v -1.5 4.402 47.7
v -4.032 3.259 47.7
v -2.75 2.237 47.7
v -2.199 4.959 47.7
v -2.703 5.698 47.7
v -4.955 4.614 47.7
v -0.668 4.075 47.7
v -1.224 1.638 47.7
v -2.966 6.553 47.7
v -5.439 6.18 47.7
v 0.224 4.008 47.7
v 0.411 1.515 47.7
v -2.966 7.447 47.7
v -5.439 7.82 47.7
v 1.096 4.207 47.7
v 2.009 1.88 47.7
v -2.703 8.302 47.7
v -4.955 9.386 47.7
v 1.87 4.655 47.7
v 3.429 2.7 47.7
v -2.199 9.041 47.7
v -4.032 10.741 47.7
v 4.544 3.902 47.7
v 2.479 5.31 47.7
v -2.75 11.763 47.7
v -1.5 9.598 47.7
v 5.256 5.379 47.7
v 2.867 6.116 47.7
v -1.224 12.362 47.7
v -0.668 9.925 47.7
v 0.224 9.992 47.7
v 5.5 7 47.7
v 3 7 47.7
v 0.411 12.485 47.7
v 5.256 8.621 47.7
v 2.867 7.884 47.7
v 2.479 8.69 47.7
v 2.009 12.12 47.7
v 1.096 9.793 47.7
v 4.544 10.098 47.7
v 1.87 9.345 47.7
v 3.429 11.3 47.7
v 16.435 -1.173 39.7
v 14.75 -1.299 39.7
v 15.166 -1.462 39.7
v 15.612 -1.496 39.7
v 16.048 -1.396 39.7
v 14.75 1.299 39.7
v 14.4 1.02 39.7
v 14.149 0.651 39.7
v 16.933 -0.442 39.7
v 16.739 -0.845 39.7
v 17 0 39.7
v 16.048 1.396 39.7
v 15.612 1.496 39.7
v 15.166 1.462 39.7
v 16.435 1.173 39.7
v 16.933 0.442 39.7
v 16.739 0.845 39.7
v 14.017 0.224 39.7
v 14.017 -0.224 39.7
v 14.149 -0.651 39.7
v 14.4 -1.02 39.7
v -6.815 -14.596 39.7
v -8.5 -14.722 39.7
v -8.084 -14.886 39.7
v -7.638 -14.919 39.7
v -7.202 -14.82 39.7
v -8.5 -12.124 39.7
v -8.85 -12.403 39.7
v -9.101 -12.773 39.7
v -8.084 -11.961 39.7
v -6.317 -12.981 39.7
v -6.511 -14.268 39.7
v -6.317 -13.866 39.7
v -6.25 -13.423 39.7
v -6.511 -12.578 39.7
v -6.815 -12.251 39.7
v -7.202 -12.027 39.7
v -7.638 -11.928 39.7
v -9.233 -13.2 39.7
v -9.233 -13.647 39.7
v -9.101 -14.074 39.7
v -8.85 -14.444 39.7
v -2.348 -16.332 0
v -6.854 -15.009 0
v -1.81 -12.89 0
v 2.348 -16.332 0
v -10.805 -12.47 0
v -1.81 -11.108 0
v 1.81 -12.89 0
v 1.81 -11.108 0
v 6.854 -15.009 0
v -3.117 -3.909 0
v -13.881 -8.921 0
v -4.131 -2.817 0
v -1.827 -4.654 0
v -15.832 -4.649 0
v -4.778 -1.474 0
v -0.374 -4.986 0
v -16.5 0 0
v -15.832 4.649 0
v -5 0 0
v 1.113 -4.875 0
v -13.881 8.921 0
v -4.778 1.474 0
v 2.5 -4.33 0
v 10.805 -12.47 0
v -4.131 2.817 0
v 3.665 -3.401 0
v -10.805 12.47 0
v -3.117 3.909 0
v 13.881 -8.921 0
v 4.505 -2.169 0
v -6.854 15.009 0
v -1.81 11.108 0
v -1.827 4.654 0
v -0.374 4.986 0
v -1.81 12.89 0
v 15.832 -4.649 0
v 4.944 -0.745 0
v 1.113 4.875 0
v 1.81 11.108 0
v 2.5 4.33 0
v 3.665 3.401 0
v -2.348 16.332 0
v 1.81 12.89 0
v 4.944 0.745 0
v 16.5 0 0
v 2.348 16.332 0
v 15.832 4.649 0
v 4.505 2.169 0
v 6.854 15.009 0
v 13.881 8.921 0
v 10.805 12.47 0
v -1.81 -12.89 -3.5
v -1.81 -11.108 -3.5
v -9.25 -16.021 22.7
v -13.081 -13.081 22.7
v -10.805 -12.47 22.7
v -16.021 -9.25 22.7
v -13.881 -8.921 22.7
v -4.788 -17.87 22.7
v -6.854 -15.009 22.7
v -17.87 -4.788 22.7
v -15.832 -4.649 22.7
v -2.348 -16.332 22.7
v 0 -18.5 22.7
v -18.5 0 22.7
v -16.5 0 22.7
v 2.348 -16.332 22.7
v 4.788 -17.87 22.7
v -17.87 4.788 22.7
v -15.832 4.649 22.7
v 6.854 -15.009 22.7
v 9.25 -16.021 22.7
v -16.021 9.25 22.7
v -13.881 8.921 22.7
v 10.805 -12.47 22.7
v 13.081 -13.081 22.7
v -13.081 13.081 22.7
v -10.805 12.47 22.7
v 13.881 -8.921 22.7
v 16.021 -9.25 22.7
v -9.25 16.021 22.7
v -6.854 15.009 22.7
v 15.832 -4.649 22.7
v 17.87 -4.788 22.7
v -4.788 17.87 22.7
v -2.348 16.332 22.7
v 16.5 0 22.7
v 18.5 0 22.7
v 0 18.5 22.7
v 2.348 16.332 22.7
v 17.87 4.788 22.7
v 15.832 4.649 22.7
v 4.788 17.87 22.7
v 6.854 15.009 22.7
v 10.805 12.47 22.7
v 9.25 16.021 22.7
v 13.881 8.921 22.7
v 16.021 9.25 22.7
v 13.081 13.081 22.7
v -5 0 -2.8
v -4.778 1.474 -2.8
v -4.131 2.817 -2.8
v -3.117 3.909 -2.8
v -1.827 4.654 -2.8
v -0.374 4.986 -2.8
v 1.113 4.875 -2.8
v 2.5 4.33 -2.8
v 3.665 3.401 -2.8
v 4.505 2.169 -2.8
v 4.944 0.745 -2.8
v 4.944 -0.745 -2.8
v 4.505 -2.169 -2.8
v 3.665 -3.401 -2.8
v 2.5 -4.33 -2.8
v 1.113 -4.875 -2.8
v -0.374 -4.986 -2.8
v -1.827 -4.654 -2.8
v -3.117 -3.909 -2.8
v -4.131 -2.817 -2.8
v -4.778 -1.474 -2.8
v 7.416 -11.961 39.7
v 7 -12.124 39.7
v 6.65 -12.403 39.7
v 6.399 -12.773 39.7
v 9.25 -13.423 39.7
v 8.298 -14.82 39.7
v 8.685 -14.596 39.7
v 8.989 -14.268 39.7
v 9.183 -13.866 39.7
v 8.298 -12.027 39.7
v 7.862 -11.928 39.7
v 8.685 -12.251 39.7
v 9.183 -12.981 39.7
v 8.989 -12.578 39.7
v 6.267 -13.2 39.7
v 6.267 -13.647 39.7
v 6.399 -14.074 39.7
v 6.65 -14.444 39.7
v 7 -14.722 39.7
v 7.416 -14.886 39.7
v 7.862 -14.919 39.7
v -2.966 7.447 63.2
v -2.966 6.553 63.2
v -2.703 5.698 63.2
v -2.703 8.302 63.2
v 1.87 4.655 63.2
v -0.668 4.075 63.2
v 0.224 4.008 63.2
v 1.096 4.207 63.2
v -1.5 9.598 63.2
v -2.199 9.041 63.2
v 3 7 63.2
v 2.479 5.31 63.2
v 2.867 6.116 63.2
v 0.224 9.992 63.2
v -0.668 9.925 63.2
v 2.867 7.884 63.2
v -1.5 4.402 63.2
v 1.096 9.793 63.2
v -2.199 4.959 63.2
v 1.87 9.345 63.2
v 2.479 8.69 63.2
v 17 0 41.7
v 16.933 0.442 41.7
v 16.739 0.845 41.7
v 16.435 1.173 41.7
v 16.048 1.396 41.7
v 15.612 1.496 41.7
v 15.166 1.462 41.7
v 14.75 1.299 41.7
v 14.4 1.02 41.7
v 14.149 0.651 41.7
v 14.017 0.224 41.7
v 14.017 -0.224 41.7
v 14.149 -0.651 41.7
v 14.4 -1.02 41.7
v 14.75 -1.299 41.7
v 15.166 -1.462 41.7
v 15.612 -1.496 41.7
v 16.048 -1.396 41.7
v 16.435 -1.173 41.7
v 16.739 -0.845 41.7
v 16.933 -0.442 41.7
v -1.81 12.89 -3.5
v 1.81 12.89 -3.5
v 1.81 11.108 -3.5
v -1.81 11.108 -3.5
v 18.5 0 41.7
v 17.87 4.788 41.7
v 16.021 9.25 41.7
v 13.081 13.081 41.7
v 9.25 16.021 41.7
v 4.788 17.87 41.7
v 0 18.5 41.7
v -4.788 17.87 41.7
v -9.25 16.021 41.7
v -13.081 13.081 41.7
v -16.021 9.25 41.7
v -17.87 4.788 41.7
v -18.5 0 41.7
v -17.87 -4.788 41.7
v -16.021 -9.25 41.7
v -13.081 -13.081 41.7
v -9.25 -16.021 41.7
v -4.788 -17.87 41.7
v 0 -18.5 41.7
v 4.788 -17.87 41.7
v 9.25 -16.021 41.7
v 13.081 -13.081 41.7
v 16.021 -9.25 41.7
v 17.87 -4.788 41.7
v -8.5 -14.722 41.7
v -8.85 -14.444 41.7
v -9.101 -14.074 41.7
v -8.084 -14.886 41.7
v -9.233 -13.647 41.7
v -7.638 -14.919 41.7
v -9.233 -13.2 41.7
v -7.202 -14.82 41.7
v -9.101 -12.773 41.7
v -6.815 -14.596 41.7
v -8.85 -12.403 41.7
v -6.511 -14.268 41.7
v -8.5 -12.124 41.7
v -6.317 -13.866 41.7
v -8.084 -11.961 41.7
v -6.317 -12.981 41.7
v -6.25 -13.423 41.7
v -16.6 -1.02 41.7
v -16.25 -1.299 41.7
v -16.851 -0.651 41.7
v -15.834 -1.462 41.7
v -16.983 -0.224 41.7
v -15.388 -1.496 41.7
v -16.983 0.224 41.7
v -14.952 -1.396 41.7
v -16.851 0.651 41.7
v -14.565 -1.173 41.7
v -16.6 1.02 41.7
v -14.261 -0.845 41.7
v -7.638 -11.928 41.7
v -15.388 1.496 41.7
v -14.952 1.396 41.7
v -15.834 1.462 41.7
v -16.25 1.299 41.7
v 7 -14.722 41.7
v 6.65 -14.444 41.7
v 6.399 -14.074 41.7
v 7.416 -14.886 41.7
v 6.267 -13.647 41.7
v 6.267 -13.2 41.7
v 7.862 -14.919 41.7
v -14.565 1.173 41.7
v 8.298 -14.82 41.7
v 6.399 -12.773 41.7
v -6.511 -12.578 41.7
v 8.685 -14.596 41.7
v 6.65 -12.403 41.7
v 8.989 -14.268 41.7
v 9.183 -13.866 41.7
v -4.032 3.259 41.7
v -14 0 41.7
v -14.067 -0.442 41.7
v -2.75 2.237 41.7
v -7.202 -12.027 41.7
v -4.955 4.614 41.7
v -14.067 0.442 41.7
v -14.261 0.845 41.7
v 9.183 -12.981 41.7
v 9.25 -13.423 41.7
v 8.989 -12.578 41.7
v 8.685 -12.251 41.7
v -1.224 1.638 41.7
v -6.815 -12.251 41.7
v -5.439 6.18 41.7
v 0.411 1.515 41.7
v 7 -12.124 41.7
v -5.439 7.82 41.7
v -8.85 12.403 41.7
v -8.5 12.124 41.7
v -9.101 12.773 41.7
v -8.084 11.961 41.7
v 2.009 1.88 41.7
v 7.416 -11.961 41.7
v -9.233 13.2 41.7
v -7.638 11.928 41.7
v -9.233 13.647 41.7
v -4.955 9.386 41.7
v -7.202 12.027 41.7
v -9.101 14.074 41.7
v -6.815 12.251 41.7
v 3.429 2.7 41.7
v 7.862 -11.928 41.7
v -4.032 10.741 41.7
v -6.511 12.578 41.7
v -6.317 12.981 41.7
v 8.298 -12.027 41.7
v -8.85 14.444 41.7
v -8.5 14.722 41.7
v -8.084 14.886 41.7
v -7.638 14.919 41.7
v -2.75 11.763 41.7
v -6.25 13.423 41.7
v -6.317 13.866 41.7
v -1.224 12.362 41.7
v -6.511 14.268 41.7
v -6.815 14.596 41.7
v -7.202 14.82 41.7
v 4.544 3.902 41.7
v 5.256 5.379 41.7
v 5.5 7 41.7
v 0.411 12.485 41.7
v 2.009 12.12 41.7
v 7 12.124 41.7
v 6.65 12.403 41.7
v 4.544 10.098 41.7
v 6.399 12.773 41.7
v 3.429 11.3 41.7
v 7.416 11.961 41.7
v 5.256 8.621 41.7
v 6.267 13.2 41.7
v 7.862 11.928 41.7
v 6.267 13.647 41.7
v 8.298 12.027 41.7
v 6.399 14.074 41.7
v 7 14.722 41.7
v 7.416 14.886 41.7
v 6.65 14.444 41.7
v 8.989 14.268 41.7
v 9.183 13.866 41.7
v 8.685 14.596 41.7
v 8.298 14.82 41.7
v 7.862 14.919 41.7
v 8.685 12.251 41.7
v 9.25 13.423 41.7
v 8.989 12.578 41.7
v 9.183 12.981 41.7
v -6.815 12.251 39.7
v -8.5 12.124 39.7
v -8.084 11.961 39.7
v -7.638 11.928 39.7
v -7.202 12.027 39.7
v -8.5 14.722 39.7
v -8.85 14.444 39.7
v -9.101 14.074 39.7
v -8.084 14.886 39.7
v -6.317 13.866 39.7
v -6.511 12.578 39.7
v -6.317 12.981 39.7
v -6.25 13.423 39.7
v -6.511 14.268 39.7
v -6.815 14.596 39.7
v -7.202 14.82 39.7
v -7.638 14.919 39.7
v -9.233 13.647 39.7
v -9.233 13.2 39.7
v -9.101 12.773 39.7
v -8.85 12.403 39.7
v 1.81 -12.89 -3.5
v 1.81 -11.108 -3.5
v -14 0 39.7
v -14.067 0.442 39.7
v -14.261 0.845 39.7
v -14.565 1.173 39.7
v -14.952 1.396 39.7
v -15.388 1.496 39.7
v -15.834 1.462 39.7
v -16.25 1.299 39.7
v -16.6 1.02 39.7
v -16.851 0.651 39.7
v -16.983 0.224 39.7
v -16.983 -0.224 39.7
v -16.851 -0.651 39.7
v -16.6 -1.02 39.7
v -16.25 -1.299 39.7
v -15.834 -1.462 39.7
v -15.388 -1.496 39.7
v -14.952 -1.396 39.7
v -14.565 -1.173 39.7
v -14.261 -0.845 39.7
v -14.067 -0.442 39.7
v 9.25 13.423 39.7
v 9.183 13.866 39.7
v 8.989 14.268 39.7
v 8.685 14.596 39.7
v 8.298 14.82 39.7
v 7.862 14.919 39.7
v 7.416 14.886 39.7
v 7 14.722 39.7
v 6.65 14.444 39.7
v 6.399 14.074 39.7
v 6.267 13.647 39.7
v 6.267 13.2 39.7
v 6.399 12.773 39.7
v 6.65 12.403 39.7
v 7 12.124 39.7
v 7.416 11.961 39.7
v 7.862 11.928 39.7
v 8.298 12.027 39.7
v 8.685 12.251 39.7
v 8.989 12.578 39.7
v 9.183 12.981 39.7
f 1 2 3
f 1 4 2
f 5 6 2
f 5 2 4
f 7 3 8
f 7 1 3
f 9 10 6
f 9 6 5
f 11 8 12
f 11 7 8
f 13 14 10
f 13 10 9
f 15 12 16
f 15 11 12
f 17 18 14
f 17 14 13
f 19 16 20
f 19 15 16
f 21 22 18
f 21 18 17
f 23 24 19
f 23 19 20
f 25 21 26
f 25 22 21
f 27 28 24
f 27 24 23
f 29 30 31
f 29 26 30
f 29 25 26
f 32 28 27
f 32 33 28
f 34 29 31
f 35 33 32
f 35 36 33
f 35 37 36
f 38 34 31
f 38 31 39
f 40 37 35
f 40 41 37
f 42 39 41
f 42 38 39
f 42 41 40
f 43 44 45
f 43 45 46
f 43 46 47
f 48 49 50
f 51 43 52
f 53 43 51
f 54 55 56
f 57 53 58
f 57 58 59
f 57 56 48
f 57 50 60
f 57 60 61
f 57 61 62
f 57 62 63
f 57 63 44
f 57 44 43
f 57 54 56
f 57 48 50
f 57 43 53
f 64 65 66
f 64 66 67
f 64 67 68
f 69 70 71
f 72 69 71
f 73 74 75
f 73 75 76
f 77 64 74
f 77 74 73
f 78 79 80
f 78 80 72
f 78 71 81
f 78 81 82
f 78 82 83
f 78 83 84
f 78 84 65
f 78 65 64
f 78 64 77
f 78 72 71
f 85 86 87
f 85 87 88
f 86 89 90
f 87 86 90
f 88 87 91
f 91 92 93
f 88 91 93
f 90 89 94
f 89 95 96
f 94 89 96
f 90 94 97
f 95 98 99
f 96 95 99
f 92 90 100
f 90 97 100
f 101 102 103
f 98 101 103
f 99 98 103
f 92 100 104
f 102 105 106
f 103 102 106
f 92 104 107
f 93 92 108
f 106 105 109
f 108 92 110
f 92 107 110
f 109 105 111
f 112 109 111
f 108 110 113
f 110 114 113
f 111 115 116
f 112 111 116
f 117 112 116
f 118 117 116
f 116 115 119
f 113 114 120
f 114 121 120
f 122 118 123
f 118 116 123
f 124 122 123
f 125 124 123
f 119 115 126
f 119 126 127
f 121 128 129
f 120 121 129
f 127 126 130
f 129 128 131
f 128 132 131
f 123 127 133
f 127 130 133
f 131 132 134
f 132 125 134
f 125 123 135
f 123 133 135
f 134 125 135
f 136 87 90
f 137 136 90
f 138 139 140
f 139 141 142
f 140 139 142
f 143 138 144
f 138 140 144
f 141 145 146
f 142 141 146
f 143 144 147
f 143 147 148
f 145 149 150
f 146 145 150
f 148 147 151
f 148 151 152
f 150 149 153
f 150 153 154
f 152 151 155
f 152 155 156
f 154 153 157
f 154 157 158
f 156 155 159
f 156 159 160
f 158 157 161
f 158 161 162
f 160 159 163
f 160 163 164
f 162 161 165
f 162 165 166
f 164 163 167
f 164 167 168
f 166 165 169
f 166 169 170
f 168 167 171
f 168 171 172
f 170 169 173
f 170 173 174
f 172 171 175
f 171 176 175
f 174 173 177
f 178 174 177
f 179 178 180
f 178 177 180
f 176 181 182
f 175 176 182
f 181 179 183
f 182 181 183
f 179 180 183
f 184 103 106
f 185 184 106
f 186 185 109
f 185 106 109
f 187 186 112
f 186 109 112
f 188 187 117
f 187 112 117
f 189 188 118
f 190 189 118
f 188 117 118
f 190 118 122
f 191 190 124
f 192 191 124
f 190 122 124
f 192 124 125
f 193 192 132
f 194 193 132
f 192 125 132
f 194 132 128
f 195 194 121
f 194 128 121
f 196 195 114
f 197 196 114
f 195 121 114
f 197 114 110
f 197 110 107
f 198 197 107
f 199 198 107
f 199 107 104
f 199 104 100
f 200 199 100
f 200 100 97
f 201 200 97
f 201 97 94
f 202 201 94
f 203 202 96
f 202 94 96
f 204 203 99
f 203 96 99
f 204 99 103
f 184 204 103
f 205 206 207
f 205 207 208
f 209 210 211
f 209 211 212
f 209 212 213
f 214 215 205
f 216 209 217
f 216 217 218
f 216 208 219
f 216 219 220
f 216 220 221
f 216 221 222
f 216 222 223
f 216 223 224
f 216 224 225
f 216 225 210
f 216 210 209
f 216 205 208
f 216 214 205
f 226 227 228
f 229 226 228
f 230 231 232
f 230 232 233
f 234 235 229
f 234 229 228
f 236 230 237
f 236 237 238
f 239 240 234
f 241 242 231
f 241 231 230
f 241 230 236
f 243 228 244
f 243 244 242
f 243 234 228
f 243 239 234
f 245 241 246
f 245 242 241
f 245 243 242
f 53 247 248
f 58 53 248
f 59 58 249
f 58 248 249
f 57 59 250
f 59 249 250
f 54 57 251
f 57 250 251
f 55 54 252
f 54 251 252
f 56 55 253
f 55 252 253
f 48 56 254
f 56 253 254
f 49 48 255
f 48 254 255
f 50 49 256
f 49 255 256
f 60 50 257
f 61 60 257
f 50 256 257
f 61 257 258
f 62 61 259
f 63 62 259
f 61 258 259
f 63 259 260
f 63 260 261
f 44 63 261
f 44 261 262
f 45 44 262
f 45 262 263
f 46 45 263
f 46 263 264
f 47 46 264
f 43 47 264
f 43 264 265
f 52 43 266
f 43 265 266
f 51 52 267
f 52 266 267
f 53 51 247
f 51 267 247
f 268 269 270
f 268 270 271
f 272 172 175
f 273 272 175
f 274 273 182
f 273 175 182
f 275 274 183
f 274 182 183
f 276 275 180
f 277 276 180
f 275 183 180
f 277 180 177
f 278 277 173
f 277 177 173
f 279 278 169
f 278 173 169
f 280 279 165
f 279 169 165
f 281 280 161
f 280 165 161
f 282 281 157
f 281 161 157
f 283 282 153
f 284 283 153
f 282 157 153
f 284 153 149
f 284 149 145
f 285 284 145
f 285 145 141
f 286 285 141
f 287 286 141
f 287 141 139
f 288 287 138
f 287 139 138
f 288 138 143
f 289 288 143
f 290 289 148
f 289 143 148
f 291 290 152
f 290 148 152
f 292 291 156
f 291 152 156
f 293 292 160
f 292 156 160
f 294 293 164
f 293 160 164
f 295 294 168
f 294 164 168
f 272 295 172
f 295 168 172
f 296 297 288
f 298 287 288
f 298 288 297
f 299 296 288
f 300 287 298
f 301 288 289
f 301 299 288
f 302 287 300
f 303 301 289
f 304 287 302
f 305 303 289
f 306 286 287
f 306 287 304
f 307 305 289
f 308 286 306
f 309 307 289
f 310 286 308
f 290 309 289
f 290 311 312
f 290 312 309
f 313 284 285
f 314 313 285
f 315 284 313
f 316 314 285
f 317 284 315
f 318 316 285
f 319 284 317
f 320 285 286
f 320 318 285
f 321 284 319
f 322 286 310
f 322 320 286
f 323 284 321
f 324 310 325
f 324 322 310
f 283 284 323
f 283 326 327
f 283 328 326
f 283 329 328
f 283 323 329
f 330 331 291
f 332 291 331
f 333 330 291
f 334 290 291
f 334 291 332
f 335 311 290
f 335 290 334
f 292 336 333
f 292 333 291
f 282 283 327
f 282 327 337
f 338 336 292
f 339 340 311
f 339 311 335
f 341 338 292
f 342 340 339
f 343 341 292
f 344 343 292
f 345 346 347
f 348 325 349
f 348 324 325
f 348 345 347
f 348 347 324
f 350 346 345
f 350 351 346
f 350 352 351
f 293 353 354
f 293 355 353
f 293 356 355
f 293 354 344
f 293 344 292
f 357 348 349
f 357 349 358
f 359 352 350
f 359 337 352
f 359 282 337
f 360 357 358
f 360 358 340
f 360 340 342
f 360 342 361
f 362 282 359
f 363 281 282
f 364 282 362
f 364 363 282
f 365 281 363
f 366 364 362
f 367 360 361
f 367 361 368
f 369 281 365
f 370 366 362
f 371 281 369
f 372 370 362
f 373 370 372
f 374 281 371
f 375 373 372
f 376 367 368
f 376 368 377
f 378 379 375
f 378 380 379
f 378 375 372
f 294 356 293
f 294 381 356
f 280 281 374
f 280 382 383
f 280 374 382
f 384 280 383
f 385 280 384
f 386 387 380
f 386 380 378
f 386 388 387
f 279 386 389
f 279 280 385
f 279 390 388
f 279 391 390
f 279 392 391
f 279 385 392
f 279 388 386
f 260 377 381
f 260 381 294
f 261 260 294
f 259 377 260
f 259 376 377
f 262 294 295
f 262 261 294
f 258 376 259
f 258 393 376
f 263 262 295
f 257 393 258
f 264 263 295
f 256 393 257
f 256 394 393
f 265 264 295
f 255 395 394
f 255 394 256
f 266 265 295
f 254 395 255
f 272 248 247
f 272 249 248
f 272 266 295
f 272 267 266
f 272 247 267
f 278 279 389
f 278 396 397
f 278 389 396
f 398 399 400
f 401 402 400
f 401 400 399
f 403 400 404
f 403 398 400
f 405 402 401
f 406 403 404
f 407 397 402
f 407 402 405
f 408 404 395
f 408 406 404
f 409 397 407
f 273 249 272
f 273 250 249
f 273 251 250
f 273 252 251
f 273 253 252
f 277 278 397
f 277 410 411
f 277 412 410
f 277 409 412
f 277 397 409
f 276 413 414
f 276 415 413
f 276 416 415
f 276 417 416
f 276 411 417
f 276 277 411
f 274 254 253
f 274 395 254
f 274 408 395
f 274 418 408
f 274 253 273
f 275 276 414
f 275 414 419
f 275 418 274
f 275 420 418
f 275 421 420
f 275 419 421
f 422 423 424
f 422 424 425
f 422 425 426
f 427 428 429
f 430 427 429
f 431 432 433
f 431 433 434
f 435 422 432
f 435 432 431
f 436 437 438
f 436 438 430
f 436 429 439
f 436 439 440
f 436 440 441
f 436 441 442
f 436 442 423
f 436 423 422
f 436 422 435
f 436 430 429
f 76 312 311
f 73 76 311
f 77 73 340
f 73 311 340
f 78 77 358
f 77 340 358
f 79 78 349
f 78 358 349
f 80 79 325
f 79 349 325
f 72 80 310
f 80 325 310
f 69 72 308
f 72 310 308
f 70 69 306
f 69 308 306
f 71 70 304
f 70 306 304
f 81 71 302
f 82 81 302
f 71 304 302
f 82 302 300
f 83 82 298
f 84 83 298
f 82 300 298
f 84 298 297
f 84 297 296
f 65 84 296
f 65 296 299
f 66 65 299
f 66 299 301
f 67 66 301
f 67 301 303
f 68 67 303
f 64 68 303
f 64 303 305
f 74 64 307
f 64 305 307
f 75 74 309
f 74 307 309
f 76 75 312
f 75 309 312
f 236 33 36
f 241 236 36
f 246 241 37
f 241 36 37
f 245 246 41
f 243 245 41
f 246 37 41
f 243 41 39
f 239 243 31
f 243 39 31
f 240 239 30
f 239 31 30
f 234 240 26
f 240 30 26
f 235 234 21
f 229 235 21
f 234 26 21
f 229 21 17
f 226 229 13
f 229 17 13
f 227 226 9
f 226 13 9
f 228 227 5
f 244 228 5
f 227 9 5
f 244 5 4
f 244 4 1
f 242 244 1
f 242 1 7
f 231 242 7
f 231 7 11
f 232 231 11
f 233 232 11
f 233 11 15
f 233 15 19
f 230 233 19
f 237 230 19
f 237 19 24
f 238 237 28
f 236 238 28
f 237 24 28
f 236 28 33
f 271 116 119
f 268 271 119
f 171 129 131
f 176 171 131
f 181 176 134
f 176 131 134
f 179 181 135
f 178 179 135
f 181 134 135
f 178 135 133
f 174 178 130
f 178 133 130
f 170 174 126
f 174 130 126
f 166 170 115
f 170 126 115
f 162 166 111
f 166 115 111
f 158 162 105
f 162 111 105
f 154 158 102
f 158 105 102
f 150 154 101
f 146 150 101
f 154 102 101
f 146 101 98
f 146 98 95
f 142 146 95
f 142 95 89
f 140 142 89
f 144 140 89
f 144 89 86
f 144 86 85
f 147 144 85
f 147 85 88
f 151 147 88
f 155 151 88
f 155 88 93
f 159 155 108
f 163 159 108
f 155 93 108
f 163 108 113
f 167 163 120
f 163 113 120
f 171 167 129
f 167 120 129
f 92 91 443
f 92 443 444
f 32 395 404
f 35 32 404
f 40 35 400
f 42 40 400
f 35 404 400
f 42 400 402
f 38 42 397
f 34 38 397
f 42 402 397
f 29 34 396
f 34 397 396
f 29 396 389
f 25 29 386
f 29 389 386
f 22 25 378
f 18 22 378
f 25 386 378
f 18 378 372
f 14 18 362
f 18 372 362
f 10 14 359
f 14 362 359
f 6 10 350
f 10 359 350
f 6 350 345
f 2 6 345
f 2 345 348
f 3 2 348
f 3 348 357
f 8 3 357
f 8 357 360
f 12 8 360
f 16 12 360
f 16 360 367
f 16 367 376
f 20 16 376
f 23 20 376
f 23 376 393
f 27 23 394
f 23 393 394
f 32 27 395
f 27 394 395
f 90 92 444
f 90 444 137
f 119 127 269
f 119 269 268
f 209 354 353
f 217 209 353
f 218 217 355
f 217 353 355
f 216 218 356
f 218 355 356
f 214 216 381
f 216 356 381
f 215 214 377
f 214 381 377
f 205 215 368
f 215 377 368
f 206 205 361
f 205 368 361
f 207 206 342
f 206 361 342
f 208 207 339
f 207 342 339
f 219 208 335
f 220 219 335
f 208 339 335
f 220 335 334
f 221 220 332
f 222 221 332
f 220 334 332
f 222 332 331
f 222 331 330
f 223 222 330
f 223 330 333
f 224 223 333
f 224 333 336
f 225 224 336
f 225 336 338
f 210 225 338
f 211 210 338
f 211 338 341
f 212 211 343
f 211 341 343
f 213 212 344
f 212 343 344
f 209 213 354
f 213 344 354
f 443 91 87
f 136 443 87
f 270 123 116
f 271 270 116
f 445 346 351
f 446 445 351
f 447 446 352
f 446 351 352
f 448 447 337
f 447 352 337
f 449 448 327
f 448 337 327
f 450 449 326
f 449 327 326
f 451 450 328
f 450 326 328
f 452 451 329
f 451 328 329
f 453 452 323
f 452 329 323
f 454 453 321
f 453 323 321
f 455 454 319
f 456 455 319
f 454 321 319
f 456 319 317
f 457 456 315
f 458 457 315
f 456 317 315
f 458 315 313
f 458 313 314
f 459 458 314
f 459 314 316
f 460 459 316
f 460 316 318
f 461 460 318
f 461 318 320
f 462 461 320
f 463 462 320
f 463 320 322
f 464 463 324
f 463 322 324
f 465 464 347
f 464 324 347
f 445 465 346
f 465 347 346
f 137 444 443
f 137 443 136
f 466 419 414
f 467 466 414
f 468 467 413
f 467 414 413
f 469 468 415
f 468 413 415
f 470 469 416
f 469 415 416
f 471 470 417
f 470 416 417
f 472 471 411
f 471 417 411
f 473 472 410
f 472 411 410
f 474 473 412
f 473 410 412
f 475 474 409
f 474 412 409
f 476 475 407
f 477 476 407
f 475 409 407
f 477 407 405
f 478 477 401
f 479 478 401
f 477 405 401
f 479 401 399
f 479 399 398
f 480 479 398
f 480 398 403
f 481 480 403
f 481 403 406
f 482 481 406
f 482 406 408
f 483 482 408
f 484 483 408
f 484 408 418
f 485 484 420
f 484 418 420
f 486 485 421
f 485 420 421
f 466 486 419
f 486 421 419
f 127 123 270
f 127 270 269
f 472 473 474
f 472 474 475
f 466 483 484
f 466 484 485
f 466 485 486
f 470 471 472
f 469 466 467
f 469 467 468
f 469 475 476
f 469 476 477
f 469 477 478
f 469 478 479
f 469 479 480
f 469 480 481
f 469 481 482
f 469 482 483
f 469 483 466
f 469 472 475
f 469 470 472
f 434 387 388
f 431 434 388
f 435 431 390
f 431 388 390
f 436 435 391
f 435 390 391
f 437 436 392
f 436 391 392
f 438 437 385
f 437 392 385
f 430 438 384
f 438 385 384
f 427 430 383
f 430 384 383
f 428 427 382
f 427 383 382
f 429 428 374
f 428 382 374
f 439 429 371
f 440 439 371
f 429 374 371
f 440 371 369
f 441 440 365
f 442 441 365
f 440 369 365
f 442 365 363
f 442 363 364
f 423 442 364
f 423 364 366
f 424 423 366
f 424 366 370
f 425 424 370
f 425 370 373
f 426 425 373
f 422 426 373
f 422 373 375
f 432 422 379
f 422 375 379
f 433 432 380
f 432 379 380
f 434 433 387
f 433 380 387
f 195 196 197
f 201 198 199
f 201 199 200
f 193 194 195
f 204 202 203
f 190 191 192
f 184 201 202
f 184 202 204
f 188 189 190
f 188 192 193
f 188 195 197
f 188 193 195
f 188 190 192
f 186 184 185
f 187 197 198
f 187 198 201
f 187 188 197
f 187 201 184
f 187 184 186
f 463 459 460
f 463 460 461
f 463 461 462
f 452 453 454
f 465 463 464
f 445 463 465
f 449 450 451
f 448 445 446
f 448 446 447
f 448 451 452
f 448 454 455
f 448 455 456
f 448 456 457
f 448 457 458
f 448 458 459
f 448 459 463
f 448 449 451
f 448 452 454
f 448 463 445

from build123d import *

# Parameters (mm, degrees)
SKETCH_1_R          = 16.5
EXTRUDE_1_DEPTH     = 22.7
SKETCH_2_R          = 18.5
EXTRUDE_2_DEPTH     = 19
SKETCH_3_R          = 1.5
CUT_EXTRUDE_1_DEPTH = 2
SKETCH_4_R          = 5.5
EXTRUDE_3_DEPTH     = 6
SKETCH_5_R          = 3
EXTRUDE_4_DEPTH     = 15.5
SKETCH_6_R          = 5
EXTRUDE_5_DEPTH     = 2.8
SKETCH_7_W          = 3.619294394
SKETCH_7_H          = 1.78180647
EXTRUDE_6_DEPTH     = 3.5


with BuildPart() as part:
    # 草图1 → 凸台-拉伸1 (new body)
    with BuildSketch(Plane.XY):
        Circle(SKETCH_1_R)
    extrude(amount=EXTRUDE_1_DEPTH)

    # 草图2 → 凸台-拉伸2 (add)
    with BuildSketch(Plane.XY.offset(22.7)):
        Circle(SKETCH_2_R)
    extrude(amount=EXTRUDE_2_DEPTH)

    # 草图3 → 切除-拉伸1 (cut)
    with BuildSketch(Plane.XY.offset(41.7)):
        with Locations((15.5, 0)):
            Circle(SKETCH_3_R)
        with Locations((7.75, -13.423393759)):
            Circle(SKETCH_3_R)
        with Locations((-7.75, -13.423393759)):
            Circle(SKETCH_3_R)
        with Locations((-15.5, 0)):
            Circle(SKETCH_3_R)
        with Locations((-7.75, 13.423393759)):
            Circle(SKETCH_3_R)
        with Locations((7.75, 13.423393759)):
            Circle(SKETCH_3_R)
    extrude(amount=-CUT_EXTRUDE_1_DEPTH, mode=Mode.SUBTRACT)

    # 草图4 → 凸台-拉伸3 (add)
    with BuildSketch(Plane.XY.offset(41.7)):
        with Locations((0, 7)):
            Circle(SKETCH_4_R)
    extrude(amount=EXTRUDE_3_DEPTH)

    # 草图5 → 凸台-拉伸4 (add)
    with BuildSketch(Plane.XY.offset(47.7)):
        with Locations((0, 7)):
            Circle(SKETCH_5_R)
    extrude(amount=EXTRUDE_4_DEPTH)

    # 草图6 → 凸台-拉伸5 (add)
    with BuildSketch(Plane(origin=(0, 0, 0), x_dir=(-1, 0, 0), z_dir=(0, 0, -1))):
        Circle(SKETCH_6_R)
    extrude(amount=EXTRUDE_5_DEPTH)

    # 草图7 → 凸台-拉伸6 (add)
    with BuildSketch(Plane(origin=(0, 0, 0), x_dir=(-1, 0, 0), z_dir=(0, 0, -1))):
        with Locations((0, 11.99935295)):
            Rectangle(SKETCH_7_W, SKETCH_7_H)
        with Locations((0, -11.99935295)):
            Rectangle(SKETCH_7_W, SKETCH_7_H)
    extrude(amount=EXTRUDE_6_DEPTH)


solid = part.part
